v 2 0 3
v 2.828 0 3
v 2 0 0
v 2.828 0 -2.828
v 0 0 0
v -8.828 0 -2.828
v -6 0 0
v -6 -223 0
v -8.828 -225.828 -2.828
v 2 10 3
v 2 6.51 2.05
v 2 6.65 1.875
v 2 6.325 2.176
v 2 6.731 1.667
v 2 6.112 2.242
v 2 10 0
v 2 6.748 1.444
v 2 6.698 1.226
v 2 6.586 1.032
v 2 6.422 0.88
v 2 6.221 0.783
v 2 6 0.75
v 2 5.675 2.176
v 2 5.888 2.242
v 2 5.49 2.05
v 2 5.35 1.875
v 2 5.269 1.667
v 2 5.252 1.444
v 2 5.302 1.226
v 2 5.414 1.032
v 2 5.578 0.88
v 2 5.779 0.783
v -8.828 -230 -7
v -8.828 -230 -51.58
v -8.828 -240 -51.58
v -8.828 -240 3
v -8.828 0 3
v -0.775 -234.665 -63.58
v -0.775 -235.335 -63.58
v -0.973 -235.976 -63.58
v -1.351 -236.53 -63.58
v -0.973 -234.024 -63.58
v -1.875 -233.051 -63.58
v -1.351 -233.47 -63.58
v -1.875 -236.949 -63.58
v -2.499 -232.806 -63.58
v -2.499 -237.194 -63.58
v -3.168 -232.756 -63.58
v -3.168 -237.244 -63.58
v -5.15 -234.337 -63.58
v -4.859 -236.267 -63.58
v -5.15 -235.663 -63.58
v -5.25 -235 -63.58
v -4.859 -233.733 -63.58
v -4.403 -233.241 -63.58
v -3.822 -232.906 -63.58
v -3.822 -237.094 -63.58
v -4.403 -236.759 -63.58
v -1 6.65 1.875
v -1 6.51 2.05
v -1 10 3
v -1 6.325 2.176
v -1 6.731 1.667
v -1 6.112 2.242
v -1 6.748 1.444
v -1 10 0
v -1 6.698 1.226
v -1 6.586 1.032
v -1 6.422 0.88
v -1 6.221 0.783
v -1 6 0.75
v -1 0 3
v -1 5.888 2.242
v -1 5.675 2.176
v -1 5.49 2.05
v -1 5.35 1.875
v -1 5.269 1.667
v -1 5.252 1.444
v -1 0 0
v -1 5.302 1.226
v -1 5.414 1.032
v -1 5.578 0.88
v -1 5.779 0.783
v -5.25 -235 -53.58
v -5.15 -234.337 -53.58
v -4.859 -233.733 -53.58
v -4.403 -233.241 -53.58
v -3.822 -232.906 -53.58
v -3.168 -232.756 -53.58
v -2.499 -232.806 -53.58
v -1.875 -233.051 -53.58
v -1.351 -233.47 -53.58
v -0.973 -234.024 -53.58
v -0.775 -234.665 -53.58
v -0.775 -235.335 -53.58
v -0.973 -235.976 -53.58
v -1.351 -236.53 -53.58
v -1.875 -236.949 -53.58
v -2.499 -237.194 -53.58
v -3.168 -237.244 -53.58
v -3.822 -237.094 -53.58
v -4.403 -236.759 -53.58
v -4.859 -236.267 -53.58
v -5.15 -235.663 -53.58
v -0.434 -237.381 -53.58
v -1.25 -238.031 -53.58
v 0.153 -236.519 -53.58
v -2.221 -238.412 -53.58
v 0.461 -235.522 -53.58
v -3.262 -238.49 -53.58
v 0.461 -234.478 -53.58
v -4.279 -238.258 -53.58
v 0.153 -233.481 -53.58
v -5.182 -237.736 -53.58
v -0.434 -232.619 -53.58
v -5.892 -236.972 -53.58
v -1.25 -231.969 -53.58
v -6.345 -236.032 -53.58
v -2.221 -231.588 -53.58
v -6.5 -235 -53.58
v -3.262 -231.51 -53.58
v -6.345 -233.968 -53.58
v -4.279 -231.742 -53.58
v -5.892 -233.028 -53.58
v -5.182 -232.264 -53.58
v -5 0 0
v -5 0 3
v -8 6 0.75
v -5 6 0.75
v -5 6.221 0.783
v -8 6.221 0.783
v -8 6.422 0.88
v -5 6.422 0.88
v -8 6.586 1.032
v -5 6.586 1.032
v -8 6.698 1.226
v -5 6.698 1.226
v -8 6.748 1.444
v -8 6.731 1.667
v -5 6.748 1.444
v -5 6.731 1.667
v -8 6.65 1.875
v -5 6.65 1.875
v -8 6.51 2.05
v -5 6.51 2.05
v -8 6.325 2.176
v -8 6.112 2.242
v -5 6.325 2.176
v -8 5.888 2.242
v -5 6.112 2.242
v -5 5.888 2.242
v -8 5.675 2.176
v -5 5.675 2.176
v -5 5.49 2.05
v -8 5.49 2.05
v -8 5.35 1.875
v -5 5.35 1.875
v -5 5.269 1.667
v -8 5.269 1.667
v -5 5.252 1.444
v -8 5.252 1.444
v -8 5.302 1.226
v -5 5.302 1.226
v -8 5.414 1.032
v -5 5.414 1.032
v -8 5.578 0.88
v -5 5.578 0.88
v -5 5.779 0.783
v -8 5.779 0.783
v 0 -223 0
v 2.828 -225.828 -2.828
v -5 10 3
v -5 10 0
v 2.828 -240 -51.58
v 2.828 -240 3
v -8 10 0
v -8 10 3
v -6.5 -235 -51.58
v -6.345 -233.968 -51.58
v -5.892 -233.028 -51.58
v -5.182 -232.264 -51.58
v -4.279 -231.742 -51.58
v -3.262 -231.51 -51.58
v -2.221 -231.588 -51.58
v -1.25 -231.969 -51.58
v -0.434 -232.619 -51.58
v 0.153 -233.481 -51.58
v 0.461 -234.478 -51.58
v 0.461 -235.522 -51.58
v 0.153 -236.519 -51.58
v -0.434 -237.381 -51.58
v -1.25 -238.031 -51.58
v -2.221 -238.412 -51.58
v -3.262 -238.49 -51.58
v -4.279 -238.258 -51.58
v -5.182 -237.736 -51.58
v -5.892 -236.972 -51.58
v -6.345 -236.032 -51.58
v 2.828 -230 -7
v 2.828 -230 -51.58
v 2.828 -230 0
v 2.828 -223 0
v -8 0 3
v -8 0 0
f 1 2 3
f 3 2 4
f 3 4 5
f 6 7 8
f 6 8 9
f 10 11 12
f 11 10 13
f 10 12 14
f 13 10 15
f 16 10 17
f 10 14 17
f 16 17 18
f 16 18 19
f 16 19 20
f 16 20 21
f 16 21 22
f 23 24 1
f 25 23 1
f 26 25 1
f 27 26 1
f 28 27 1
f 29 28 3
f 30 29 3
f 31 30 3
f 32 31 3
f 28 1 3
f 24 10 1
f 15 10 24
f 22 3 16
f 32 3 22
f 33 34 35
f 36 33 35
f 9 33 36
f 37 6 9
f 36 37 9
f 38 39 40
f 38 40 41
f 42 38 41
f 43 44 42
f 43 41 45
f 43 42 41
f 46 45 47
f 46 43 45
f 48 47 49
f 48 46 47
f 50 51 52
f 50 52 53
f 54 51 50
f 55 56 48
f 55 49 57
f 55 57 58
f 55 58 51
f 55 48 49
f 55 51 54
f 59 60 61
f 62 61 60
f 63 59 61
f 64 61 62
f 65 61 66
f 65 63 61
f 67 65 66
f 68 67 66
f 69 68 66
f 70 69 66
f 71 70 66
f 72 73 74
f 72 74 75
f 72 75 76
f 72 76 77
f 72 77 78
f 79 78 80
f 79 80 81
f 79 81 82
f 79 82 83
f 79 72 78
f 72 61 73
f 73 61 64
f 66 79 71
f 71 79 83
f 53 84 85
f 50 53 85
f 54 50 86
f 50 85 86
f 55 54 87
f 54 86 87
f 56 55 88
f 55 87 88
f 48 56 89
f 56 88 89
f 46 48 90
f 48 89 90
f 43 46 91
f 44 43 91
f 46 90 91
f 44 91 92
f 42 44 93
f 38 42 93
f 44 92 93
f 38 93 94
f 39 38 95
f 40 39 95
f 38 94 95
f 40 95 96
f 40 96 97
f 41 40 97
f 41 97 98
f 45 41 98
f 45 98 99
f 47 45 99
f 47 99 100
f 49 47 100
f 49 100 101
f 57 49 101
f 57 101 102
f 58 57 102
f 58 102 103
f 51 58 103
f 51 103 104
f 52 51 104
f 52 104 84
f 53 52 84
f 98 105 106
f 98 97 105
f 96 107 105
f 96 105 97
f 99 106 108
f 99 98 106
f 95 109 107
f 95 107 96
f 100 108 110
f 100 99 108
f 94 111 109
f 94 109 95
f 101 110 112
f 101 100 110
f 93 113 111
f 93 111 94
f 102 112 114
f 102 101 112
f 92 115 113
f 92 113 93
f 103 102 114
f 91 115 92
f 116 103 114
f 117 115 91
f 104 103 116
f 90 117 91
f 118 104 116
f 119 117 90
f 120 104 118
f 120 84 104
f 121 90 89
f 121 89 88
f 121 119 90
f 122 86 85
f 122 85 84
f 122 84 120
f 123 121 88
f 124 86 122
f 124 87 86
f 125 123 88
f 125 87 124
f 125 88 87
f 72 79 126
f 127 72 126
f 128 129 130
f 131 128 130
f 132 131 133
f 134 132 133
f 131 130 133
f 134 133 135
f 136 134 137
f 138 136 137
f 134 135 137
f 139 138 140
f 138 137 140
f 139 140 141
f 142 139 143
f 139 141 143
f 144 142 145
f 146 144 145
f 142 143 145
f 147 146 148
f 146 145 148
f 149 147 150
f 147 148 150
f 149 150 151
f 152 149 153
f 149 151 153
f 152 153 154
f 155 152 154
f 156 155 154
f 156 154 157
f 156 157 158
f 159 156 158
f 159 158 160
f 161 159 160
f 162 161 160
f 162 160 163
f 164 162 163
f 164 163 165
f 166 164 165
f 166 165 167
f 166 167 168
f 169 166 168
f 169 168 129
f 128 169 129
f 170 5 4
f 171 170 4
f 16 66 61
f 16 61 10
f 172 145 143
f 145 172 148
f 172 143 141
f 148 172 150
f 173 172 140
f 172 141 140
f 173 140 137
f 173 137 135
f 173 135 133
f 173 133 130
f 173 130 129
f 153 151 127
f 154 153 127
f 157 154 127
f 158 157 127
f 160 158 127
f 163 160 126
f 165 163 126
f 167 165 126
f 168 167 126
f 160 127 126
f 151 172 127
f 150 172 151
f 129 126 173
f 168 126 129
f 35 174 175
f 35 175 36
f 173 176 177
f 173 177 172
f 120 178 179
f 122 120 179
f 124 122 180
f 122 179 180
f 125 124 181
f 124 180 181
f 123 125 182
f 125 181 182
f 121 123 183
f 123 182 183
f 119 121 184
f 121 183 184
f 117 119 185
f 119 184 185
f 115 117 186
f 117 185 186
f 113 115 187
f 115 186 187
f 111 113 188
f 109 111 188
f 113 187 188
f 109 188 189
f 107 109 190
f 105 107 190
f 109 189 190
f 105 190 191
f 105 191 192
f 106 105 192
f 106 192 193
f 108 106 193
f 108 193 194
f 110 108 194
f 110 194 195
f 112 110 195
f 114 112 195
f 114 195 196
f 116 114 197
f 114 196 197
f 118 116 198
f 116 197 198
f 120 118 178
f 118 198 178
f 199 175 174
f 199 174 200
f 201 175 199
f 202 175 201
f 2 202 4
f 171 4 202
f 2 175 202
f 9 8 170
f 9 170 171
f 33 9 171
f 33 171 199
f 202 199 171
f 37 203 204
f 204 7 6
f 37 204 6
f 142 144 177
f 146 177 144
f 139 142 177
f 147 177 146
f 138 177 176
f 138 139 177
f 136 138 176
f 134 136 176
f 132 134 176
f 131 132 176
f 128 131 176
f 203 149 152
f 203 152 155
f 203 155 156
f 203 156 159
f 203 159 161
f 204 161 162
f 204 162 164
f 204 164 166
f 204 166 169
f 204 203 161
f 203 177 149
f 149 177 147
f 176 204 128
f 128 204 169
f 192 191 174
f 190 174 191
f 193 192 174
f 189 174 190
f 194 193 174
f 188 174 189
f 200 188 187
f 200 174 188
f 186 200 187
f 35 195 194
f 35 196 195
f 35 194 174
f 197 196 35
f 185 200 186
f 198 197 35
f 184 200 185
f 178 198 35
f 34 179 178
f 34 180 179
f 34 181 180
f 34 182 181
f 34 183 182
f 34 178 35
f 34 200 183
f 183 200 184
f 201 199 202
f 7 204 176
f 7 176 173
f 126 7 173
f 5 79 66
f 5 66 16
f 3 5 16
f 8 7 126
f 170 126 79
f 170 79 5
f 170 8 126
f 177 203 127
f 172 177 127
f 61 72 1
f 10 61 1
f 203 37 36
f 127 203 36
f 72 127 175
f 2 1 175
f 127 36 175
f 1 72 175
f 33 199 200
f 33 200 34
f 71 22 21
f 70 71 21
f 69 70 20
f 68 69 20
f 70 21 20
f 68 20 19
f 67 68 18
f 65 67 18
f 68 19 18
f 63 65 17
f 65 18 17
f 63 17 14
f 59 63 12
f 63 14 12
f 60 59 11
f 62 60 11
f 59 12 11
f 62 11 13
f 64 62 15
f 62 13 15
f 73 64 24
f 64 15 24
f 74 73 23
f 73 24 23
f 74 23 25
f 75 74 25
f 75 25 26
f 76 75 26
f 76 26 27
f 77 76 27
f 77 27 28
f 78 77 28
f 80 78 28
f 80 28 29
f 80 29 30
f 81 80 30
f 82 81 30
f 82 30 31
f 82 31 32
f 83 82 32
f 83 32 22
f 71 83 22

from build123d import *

# Parameters (mm, degrees)
SKETCH2_W           = 6
SKETCH2_H           = 240
BOSS_EXTRUDE1_DEPTH = 3
BOSS_EXTRUDE2_DEPTH = 240
SKETCH5_W           = 3
SKETCH5_H           = 3
BOSS_EXTRUDE3_DEPTH = 10
SKETCH6_R           = 0.75
CUT_EXTRUDE1_DEPTH  = 40
SKETCH7_W           = 11.65685425
SKETCH7_H           = 10
BOSS_EXTRUDE4_DEPTH = 51.58
SKETCH8_R           = 2.25
BOSS_EXTRUDE5_DEPTH = 12
BOSS_EXTRUDE6_DEPTH = 11.656857
SKETCH10_R          = 3.5
BOSS_EXTRUDE7_DEPTH = 2


with BuildPart() as part:
    # Sketch2 → Boss-Extrude1 (new body)
    with BuildSketch(Plane.XY):
        with Locations((-3, -120)):
            Rectangle(SKETCH2_W, SKETCH2_H)
    extrude(amount=BOSS_EXTRUDE1_DEPTH)

    # Sketch4 → Boss-Extrude2 (add)
    with BuildSketch(Plane(origin=(0, -240, 0), x_dir=(-1, 0, 0), z_dir=(0, -1, 0))):
        Polygon((0, 0), (-2.828427125, 2.828427125), (-2.828427125, -3), (0, -3), align=None)
        Polygon((8.828427125, -3), (6, -3), (6, 0), (8.828427125, 2.828427125), align=None)
    extrude(amount=-BOSS_EXTRUDE2_DEPTH)

    # Sketch5 → Boss-Extrude3 (add)
    with BuildSketch(Plane(origin=(0, 0, 0), x_dir=(1, 0, 0), z_dir=(0, 1, 0))):
        with Locations((-6.5, -1.5)):
            Rectangle(SKETCH5_W, SKETCH5_H)
        with Locations((0.5, -1.5)):
            Rectangle(SKETCH5_W, SKETCH5_H)
    extrude(amount=BOSS_EXTRUDE3_DEPTH)

    # Sketch6 → Cut-Extrude1 (cut)
    with BuildSketch(Plane(origin=(2, 0, 0), x_dir=(0, 0, -1), z_dir=(1, 0, 0))):
        with Locations((-1.5, 6)):
            Circle(SKETCH6_R)
    extrude(amount=-CUT_EXTRUDE1_DEPTH, mode=Mode.SUBTRACT)

    # Sketch7 → Boss-Extrude4 (add)
    with BuildSketch(Plane(origin=(0, 0, 0), x_dir=(-1, 0, 0), z_dir=(0, 0, -1))):
        with Locations((3, -235)):
            Rectangle(SKETCH7_W, SKETCH7_H)
    extrude(amount=BOSS_EXTRUDE4_DEPTH)

    # Sketch8 → Boss-Extrude5 (add)
    with BuildSketch(Plane(origin=(0, 0, -51.58), x_dir=(-1, 0, 0), z_dir=(0, 0, -1))):
        with Locations((3, -235)):
            Circle(SKETCH8_R)
    extrude(amount=BOSS_EXTRUDE5_DEPTH)

    # Sketch9 → Boss-Extrude6 (add)
    with BuildSketch(Plane.ZY.offset(8.828427125)):
        Polygon((-7, -230), (0, -230), (0, -223), align=None)
    extrude(amount=-BOSS_EXTRUDE6_DEPTH)

    # Sketch10 → Boss-Extrude7 (add)
    with BuildSketch(Plane(origin=(0, 0, -51.58), x_dir=(-1, 0, 0), z_dir=(0, 0, -1))):
        with Locations((3, -235)):
            Circle(SKETCH10_R)
    extrude(amount=BOSS_EXTRUDE7_DEPTH)


solid = part.part
